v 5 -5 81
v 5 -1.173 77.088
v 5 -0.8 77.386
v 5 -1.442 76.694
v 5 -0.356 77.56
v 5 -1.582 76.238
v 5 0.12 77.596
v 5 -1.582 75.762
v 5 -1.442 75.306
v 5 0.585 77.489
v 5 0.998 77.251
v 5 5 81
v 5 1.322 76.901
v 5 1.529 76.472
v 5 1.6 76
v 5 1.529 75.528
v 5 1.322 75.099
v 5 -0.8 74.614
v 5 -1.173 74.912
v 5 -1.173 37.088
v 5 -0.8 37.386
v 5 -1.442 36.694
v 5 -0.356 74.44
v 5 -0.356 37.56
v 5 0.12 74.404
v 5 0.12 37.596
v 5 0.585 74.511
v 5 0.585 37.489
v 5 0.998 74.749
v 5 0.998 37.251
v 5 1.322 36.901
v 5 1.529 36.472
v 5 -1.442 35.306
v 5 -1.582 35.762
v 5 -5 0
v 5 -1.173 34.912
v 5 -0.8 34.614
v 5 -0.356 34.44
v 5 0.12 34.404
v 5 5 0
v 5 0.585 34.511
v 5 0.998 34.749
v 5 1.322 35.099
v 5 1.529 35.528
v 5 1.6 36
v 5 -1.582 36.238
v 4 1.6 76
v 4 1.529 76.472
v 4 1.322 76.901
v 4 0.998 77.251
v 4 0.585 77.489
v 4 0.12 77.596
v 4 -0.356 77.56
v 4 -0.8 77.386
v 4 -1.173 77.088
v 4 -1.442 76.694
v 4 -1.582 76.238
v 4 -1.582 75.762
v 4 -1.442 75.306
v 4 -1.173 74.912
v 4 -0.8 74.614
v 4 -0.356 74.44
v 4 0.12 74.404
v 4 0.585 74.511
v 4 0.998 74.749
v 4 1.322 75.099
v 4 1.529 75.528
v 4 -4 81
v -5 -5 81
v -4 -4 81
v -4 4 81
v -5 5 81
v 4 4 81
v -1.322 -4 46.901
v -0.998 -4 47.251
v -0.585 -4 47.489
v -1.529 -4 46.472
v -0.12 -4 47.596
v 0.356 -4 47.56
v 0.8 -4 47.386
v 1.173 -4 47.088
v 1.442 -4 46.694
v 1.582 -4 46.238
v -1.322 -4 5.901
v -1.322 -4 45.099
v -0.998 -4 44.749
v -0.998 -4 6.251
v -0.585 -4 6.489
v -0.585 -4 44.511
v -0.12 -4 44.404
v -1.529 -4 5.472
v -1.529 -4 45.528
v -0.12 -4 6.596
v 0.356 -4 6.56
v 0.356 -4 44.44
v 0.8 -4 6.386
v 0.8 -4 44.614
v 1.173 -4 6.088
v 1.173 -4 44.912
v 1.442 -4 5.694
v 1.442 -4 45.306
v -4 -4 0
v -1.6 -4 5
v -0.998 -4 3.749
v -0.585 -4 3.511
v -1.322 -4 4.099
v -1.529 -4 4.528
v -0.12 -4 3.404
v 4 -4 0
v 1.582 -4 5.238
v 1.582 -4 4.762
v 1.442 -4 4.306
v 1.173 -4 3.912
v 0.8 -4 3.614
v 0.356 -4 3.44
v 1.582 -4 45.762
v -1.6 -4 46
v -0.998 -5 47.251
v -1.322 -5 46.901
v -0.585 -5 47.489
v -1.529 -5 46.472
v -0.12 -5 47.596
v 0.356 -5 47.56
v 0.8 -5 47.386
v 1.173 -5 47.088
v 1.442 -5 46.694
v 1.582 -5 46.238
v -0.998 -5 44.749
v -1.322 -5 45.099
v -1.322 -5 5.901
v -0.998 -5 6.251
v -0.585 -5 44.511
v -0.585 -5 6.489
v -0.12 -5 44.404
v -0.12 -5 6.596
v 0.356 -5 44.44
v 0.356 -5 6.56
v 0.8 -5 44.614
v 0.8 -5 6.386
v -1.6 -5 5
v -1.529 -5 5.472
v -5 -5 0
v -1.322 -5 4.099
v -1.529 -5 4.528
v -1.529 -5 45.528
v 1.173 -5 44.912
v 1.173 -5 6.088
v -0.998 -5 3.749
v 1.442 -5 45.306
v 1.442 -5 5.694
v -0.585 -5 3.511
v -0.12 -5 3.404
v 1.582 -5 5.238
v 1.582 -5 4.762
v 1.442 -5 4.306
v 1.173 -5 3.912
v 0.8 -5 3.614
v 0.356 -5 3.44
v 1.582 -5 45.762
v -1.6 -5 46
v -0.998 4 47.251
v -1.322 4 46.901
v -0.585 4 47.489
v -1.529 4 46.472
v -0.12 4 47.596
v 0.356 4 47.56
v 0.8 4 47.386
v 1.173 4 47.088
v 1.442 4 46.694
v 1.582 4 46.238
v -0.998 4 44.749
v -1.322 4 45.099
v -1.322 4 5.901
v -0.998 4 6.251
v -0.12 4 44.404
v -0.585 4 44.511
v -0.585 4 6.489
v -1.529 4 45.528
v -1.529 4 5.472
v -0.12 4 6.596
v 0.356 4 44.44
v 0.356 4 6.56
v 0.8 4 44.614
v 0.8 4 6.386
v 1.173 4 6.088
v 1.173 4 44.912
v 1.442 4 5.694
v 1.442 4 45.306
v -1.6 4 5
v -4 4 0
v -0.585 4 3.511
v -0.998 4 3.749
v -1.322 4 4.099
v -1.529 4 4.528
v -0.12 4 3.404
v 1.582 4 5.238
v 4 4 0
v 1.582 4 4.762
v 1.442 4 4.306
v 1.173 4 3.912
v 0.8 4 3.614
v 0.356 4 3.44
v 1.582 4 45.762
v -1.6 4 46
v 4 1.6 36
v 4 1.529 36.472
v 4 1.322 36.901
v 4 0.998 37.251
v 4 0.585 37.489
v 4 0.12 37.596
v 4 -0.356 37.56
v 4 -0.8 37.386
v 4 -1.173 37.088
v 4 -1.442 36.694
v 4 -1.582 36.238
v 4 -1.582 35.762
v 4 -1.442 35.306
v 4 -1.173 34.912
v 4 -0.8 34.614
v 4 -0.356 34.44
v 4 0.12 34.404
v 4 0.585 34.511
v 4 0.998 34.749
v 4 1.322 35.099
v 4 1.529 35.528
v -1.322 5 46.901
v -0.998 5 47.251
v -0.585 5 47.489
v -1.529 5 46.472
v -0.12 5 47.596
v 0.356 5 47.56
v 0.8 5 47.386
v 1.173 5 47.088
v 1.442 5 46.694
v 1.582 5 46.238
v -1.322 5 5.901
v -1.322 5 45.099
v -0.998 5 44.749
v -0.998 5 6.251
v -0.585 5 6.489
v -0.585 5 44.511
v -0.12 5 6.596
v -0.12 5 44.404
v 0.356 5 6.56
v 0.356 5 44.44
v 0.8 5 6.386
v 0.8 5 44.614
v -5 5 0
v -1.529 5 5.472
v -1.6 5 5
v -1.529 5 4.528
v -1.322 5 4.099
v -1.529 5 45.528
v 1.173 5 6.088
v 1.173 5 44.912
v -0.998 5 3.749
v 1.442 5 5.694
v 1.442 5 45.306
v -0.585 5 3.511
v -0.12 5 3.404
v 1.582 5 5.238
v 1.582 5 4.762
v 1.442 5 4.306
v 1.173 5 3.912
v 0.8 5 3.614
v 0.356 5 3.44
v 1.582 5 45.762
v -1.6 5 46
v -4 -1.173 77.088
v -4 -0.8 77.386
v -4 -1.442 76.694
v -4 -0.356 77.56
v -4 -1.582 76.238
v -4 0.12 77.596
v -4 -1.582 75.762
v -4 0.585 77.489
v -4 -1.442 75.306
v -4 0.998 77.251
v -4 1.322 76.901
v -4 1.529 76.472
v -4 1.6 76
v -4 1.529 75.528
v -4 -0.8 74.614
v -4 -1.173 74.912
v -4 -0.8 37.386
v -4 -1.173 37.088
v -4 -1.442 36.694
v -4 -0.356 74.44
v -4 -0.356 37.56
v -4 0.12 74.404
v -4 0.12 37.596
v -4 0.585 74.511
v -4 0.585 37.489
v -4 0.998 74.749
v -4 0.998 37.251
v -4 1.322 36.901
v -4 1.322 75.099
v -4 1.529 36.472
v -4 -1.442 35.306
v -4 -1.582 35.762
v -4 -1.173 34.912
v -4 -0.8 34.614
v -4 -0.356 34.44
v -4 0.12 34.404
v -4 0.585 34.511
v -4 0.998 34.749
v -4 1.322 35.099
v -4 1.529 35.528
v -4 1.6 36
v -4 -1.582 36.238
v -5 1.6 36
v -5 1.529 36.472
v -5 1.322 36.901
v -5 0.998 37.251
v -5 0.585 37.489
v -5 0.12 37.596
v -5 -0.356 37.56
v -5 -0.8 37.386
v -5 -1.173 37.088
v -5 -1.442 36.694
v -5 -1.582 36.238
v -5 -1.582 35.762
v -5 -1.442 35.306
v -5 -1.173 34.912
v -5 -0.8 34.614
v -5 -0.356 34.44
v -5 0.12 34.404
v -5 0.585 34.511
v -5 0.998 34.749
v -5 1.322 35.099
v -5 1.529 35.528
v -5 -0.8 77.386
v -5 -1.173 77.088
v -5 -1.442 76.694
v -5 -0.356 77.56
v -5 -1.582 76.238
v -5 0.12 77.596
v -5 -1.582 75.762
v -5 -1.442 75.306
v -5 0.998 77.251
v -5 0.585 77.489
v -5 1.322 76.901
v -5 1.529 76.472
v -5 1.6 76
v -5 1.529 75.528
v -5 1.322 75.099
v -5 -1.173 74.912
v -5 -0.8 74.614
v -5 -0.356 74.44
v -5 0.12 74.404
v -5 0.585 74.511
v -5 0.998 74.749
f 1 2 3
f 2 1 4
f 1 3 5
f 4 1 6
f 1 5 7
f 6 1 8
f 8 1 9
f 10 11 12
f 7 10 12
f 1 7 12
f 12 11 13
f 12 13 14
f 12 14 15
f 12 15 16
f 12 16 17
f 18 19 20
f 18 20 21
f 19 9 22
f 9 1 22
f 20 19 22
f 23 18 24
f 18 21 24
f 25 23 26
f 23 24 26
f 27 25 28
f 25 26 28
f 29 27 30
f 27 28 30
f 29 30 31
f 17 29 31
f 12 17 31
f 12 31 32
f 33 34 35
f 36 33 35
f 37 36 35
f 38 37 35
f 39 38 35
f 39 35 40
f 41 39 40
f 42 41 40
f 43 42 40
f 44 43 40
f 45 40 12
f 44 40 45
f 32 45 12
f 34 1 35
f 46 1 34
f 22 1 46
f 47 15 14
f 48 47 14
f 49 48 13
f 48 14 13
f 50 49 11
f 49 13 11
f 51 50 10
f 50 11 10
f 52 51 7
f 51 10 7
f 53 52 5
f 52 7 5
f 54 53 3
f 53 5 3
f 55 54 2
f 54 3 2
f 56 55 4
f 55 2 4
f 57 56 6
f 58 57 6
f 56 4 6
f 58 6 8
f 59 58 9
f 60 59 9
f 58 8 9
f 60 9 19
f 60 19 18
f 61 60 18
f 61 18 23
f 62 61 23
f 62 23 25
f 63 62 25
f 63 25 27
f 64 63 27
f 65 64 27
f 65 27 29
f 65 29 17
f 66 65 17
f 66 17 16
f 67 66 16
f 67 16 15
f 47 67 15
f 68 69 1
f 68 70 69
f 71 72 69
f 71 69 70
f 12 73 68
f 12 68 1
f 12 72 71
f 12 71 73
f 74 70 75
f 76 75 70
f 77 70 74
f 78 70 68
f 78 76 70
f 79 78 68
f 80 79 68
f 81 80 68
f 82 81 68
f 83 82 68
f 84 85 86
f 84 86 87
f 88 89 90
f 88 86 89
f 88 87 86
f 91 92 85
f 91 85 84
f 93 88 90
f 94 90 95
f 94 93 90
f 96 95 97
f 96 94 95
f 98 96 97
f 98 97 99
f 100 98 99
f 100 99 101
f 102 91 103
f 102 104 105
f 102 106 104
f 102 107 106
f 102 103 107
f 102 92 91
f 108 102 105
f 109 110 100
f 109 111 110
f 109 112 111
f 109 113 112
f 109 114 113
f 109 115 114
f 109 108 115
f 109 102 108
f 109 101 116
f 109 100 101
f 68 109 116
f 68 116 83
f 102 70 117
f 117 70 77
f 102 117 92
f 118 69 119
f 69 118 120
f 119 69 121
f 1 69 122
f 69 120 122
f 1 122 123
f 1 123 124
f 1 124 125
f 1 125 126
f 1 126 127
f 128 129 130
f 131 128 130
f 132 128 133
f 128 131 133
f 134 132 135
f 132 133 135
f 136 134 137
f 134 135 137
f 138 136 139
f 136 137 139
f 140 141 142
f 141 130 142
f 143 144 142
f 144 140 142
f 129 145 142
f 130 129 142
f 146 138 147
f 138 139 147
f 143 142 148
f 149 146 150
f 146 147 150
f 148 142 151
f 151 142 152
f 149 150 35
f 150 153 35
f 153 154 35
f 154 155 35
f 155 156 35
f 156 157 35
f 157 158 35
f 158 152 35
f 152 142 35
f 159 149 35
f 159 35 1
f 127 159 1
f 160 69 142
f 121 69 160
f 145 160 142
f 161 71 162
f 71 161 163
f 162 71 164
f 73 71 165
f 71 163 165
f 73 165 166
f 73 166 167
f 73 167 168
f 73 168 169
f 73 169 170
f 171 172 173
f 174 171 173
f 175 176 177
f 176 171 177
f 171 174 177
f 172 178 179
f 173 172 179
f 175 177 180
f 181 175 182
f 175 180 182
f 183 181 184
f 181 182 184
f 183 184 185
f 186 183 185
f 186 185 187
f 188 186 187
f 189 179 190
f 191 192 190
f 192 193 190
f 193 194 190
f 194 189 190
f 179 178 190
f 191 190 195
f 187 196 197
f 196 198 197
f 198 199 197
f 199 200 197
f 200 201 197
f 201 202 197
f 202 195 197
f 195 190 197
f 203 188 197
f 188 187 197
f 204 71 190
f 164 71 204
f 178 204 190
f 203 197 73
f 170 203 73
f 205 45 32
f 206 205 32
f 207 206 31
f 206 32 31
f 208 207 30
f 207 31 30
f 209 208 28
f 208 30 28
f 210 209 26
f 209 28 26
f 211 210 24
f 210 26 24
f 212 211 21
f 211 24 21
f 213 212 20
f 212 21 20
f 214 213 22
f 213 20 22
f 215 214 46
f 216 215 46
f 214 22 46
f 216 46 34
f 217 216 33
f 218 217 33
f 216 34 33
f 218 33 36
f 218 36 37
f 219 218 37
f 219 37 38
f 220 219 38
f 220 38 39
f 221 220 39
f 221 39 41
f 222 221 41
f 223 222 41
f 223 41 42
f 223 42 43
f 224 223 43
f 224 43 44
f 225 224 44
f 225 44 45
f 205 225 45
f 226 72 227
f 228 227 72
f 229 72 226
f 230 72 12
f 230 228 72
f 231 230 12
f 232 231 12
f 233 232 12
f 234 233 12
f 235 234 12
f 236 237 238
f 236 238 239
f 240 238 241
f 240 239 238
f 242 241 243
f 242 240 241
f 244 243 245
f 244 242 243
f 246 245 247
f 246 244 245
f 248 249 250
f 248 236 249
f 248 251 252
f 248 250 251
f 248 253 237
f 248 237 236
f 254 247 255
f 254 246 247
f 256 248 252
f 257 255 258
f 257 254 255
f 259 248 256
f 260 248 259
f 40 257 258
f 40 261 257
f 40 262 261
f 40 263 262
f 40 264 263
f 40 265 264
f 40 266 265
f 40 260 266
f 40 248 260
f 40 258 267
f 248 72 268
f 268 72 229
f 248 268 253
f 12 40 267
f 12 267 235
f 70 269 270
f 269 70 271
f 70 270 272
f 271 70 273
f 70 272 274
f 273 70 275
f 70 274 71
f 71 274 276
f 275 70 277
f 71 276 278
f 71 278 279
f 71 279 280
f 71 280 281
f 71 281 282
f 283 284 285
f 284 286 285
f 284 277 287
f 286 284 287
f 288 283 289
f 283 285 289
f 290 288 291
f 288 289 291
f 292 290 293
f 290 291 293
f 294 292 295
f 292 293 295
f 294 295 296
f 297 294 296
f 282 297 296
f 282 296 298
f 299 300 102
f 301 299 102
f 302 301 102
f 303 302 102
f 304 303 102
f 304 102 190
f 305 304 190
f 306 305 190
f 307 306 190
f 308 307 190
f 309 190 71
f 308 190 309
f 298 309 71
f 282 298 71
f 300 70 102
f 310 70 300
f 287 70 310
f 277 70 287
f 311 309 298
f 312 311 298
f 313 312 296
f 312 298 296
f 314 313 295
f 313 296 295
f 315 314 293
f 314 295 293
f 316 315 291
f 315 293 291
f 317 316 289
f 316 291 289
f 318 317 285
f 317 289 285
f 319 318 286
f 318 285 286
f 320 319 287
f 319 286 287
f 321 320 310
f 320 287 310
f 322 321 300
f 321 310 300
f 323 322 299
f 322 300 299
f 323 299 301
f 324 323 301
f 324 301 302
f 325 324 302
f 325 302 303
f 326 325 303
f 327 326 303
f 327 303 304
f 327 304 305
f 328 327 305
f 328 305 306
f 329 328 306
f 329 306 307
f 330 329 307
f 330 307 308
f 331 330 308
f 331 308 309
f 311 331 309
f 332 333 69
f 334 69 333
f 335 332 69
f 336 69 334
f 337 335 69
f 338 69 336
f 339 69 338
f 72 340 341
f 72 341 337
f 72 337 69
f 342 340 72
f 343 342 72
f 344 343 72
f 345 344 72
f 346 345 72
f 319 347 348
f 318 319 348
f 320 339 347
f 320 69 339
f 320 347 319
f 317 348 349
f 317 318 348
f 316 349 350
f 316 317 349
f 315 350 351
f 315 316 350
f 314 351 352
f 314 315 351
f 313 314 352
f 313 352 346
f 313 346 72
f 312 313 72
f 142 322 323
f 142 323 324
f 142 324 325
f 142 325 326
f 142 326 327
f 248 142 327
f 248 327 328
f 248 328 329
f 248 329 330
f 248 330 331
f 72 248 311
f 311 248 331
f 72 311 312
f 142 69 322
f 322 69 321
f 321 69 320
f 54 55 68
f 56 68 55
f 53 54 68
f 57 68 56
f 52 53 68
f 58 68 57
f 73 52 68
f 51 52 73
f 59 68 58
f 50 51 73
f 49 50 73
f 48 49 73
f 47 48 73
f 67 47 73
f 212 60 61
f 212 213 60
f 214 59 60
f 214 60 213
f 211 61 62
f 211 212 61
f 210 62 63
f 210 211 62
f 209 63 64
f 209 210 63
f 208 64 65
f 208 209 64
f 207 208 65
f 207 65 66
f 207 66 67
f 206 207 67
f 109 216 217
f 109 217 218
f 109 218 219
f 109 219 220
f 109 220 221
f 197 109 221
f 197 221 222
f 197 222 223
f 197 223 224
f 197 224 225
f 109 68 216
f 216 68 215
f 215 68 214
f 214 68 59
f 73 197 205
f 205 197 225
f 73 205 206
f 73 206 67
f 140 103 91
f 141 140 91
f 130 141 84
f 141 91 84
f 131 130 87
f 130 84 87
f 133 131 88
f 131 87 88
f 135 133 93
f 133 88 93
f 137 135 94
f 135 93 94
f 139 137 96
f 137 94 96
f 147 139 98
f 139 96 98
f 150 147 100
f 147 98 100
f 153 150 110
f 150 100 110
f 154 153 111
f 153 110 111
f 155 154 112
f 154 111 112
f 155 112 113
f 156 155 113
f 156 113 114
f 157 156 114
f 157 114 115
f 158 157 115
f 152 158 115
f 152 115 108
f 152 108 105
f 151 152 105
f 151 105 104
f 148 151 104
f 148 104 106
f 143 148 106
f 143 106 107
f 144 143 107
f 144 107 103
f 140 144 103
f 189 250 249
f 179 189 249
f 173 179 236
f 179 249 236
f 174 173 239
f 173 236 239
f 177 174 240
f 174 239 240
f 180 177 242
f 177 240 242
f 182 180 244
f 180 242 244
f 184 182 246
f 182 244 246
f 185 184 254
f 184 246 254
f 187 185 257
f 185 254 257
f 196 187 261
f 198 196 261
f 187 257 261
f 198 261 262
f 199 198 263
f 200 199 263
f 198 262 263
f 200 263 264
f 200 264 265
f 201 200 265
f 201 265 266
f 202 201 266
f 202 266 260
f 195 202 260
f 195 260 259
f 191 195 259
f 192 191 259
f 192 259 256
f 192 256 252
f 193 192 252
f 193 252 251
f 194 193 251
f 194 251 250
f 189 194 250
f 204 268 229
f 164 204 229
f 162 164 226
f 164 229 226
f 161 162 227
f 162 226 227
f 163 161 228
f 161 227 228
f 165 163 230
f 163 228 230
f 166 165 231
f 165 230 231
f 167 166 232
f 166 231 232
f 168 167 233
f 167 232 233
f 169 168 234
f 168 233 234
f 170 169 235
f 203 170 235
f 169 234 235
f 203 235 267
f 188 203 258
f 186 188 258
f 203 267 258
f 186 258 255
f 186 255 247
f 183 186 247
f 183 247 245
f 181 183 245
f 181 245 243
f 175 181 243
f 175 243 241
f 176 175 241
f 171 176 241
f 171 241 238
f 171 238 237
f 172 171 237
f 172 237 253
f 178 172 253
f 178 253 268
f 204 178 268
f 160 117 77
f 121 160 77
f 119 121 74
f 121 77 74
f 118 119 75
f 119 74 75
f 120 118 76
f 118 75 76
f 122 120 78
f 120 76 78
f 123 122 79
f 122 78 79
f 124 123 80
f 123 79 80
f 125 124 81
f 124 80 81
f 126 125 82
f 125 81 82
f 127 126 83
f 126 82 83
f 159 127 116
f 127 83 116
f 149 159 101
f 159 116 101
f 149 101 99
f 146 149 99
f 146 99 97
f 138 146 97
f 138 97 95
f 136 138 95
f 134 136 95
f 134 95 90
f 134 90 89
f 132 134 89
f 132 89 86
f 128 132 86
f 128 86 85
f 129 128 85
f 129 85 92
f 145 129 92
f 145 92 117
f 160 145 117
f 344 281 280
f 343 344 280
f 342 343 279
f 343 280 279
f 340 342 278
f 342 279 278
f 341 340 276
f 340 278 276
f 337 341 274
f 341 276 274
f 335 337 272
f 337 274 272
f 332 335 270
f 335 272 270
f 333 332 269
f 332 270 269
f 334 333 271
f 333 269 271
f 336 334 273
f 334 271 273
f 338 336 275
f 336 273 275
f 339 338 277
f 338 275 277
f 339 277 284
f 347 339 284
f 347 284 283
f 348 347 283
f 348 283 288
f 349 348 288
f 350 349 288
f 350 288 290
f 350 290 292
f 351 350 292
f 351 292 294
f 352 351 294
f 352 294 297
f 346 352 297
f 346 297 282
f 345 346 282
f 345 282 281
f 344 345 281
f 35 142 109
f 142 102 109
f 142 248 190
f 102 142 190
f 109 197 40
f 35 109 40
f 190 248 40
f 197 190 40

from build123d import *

# Parameters (mm, degrees)
SKETCH_1_W          = 10
SKETCH_1_H          = 10
SKETCH_1_W_2        = 8
SKETCH_1_H_2        = 8
EXTRUDE_1_DEPTH     = 51
SKETCH_2_R          = 1.6
CUT_EXTRUDE_1_DEPTH = 53.211109929
SKETCH_3_R          = 1.6
CUT_EXTRUDE_2_DEPTH = 10
SKETCH_4_W          = 10
SKETCH_4_H          = 10
SKETCH_4_W_2        = 8
SKETCH_4_H_2        = 8
EXTRUDE_1_2_DEPTH   = 30
SKETCH_5_R          = 1.6
CUT_EXTRUDE_3_DEPTH = 82.767964387


with BuildPart() as part:
    # ｽｹｯﾁ1 → Extrude 1 (new body)
    with BuildSketch(Plane.XY):
        Rectangle(SKETCH_1_W, SKETCH_1_H)
        Rectangle(SKETCH_1_W_2, SKETCH_1_H_2, mode=Mode.SUBTRACT)
    extrude(amount=EXTRUDE_1_DEPTH)

    # ｽｹｯﾁ2 → ｶｯﾄ - 押し出し1 (cut, through all)
    with BuildSketch(Plane(origin=(5, 0, 0), x_dir=(0, 0, -1), z_dir=(1, 0, 0))):
        with Locations(Location((-36, 0, 0), (0, 0, 90))):
            Circle(SKETCH_2_R)
    extrude(amount=-CUT_EXTRUDE_1_DEPTH, mode=Mode.SUBTRACT)

    # ｽｹｯﾁ3 → ｶｯﾄ - 押し出し2 (cut)
    with BuildSketch(Plane(origin=(0, 5, 0), x_dir=(1, 0, 0), z_dir=(0, 1, 0))):
        with Locations(Location((0, -46, 0), (0, 0, 180))):
            Circle(SKETCH_3_R)
        with Locations(Location((0, -5, 0), (0, 0, 180))):
            Circle(SKETCH_3_R)
    extrude(amount=-CUT_EXTRUDE_2_DEPTH, mode=Mode.SUBTRACT)

    # ｽｹｯﾁ4 → Extrude 1 2 (add)
    with BuildSketch(Plane.XY.offset(51)):
        Rectangle(SKETCH_4_W, SKETCH_4_H)
        Rectangle(SKETCH_4_W_2, SKETCH_4_H_2, mode=Mode.SUBTRACT)
    extrude(amount=EXTRUDE_1_2_DEPTH)

    # ｽｹｯﾁ5 → ｶｯﾄ - 押し出し3 (cut, through all)
    with BuildSketch(Plane(origin=(5, 0, 0), x_dir=(0, 0, -1), z_dir=(1, 0, 0))):
        with Locations(Location((-76, 0, 0), (0, 0, 90))):
            Circle(SKETCH_5_R)
    extrude(amount=-CUT_EXTRUDE_3_DEPTH, mode=Mode.SUBTRACT)


solid = part.part
